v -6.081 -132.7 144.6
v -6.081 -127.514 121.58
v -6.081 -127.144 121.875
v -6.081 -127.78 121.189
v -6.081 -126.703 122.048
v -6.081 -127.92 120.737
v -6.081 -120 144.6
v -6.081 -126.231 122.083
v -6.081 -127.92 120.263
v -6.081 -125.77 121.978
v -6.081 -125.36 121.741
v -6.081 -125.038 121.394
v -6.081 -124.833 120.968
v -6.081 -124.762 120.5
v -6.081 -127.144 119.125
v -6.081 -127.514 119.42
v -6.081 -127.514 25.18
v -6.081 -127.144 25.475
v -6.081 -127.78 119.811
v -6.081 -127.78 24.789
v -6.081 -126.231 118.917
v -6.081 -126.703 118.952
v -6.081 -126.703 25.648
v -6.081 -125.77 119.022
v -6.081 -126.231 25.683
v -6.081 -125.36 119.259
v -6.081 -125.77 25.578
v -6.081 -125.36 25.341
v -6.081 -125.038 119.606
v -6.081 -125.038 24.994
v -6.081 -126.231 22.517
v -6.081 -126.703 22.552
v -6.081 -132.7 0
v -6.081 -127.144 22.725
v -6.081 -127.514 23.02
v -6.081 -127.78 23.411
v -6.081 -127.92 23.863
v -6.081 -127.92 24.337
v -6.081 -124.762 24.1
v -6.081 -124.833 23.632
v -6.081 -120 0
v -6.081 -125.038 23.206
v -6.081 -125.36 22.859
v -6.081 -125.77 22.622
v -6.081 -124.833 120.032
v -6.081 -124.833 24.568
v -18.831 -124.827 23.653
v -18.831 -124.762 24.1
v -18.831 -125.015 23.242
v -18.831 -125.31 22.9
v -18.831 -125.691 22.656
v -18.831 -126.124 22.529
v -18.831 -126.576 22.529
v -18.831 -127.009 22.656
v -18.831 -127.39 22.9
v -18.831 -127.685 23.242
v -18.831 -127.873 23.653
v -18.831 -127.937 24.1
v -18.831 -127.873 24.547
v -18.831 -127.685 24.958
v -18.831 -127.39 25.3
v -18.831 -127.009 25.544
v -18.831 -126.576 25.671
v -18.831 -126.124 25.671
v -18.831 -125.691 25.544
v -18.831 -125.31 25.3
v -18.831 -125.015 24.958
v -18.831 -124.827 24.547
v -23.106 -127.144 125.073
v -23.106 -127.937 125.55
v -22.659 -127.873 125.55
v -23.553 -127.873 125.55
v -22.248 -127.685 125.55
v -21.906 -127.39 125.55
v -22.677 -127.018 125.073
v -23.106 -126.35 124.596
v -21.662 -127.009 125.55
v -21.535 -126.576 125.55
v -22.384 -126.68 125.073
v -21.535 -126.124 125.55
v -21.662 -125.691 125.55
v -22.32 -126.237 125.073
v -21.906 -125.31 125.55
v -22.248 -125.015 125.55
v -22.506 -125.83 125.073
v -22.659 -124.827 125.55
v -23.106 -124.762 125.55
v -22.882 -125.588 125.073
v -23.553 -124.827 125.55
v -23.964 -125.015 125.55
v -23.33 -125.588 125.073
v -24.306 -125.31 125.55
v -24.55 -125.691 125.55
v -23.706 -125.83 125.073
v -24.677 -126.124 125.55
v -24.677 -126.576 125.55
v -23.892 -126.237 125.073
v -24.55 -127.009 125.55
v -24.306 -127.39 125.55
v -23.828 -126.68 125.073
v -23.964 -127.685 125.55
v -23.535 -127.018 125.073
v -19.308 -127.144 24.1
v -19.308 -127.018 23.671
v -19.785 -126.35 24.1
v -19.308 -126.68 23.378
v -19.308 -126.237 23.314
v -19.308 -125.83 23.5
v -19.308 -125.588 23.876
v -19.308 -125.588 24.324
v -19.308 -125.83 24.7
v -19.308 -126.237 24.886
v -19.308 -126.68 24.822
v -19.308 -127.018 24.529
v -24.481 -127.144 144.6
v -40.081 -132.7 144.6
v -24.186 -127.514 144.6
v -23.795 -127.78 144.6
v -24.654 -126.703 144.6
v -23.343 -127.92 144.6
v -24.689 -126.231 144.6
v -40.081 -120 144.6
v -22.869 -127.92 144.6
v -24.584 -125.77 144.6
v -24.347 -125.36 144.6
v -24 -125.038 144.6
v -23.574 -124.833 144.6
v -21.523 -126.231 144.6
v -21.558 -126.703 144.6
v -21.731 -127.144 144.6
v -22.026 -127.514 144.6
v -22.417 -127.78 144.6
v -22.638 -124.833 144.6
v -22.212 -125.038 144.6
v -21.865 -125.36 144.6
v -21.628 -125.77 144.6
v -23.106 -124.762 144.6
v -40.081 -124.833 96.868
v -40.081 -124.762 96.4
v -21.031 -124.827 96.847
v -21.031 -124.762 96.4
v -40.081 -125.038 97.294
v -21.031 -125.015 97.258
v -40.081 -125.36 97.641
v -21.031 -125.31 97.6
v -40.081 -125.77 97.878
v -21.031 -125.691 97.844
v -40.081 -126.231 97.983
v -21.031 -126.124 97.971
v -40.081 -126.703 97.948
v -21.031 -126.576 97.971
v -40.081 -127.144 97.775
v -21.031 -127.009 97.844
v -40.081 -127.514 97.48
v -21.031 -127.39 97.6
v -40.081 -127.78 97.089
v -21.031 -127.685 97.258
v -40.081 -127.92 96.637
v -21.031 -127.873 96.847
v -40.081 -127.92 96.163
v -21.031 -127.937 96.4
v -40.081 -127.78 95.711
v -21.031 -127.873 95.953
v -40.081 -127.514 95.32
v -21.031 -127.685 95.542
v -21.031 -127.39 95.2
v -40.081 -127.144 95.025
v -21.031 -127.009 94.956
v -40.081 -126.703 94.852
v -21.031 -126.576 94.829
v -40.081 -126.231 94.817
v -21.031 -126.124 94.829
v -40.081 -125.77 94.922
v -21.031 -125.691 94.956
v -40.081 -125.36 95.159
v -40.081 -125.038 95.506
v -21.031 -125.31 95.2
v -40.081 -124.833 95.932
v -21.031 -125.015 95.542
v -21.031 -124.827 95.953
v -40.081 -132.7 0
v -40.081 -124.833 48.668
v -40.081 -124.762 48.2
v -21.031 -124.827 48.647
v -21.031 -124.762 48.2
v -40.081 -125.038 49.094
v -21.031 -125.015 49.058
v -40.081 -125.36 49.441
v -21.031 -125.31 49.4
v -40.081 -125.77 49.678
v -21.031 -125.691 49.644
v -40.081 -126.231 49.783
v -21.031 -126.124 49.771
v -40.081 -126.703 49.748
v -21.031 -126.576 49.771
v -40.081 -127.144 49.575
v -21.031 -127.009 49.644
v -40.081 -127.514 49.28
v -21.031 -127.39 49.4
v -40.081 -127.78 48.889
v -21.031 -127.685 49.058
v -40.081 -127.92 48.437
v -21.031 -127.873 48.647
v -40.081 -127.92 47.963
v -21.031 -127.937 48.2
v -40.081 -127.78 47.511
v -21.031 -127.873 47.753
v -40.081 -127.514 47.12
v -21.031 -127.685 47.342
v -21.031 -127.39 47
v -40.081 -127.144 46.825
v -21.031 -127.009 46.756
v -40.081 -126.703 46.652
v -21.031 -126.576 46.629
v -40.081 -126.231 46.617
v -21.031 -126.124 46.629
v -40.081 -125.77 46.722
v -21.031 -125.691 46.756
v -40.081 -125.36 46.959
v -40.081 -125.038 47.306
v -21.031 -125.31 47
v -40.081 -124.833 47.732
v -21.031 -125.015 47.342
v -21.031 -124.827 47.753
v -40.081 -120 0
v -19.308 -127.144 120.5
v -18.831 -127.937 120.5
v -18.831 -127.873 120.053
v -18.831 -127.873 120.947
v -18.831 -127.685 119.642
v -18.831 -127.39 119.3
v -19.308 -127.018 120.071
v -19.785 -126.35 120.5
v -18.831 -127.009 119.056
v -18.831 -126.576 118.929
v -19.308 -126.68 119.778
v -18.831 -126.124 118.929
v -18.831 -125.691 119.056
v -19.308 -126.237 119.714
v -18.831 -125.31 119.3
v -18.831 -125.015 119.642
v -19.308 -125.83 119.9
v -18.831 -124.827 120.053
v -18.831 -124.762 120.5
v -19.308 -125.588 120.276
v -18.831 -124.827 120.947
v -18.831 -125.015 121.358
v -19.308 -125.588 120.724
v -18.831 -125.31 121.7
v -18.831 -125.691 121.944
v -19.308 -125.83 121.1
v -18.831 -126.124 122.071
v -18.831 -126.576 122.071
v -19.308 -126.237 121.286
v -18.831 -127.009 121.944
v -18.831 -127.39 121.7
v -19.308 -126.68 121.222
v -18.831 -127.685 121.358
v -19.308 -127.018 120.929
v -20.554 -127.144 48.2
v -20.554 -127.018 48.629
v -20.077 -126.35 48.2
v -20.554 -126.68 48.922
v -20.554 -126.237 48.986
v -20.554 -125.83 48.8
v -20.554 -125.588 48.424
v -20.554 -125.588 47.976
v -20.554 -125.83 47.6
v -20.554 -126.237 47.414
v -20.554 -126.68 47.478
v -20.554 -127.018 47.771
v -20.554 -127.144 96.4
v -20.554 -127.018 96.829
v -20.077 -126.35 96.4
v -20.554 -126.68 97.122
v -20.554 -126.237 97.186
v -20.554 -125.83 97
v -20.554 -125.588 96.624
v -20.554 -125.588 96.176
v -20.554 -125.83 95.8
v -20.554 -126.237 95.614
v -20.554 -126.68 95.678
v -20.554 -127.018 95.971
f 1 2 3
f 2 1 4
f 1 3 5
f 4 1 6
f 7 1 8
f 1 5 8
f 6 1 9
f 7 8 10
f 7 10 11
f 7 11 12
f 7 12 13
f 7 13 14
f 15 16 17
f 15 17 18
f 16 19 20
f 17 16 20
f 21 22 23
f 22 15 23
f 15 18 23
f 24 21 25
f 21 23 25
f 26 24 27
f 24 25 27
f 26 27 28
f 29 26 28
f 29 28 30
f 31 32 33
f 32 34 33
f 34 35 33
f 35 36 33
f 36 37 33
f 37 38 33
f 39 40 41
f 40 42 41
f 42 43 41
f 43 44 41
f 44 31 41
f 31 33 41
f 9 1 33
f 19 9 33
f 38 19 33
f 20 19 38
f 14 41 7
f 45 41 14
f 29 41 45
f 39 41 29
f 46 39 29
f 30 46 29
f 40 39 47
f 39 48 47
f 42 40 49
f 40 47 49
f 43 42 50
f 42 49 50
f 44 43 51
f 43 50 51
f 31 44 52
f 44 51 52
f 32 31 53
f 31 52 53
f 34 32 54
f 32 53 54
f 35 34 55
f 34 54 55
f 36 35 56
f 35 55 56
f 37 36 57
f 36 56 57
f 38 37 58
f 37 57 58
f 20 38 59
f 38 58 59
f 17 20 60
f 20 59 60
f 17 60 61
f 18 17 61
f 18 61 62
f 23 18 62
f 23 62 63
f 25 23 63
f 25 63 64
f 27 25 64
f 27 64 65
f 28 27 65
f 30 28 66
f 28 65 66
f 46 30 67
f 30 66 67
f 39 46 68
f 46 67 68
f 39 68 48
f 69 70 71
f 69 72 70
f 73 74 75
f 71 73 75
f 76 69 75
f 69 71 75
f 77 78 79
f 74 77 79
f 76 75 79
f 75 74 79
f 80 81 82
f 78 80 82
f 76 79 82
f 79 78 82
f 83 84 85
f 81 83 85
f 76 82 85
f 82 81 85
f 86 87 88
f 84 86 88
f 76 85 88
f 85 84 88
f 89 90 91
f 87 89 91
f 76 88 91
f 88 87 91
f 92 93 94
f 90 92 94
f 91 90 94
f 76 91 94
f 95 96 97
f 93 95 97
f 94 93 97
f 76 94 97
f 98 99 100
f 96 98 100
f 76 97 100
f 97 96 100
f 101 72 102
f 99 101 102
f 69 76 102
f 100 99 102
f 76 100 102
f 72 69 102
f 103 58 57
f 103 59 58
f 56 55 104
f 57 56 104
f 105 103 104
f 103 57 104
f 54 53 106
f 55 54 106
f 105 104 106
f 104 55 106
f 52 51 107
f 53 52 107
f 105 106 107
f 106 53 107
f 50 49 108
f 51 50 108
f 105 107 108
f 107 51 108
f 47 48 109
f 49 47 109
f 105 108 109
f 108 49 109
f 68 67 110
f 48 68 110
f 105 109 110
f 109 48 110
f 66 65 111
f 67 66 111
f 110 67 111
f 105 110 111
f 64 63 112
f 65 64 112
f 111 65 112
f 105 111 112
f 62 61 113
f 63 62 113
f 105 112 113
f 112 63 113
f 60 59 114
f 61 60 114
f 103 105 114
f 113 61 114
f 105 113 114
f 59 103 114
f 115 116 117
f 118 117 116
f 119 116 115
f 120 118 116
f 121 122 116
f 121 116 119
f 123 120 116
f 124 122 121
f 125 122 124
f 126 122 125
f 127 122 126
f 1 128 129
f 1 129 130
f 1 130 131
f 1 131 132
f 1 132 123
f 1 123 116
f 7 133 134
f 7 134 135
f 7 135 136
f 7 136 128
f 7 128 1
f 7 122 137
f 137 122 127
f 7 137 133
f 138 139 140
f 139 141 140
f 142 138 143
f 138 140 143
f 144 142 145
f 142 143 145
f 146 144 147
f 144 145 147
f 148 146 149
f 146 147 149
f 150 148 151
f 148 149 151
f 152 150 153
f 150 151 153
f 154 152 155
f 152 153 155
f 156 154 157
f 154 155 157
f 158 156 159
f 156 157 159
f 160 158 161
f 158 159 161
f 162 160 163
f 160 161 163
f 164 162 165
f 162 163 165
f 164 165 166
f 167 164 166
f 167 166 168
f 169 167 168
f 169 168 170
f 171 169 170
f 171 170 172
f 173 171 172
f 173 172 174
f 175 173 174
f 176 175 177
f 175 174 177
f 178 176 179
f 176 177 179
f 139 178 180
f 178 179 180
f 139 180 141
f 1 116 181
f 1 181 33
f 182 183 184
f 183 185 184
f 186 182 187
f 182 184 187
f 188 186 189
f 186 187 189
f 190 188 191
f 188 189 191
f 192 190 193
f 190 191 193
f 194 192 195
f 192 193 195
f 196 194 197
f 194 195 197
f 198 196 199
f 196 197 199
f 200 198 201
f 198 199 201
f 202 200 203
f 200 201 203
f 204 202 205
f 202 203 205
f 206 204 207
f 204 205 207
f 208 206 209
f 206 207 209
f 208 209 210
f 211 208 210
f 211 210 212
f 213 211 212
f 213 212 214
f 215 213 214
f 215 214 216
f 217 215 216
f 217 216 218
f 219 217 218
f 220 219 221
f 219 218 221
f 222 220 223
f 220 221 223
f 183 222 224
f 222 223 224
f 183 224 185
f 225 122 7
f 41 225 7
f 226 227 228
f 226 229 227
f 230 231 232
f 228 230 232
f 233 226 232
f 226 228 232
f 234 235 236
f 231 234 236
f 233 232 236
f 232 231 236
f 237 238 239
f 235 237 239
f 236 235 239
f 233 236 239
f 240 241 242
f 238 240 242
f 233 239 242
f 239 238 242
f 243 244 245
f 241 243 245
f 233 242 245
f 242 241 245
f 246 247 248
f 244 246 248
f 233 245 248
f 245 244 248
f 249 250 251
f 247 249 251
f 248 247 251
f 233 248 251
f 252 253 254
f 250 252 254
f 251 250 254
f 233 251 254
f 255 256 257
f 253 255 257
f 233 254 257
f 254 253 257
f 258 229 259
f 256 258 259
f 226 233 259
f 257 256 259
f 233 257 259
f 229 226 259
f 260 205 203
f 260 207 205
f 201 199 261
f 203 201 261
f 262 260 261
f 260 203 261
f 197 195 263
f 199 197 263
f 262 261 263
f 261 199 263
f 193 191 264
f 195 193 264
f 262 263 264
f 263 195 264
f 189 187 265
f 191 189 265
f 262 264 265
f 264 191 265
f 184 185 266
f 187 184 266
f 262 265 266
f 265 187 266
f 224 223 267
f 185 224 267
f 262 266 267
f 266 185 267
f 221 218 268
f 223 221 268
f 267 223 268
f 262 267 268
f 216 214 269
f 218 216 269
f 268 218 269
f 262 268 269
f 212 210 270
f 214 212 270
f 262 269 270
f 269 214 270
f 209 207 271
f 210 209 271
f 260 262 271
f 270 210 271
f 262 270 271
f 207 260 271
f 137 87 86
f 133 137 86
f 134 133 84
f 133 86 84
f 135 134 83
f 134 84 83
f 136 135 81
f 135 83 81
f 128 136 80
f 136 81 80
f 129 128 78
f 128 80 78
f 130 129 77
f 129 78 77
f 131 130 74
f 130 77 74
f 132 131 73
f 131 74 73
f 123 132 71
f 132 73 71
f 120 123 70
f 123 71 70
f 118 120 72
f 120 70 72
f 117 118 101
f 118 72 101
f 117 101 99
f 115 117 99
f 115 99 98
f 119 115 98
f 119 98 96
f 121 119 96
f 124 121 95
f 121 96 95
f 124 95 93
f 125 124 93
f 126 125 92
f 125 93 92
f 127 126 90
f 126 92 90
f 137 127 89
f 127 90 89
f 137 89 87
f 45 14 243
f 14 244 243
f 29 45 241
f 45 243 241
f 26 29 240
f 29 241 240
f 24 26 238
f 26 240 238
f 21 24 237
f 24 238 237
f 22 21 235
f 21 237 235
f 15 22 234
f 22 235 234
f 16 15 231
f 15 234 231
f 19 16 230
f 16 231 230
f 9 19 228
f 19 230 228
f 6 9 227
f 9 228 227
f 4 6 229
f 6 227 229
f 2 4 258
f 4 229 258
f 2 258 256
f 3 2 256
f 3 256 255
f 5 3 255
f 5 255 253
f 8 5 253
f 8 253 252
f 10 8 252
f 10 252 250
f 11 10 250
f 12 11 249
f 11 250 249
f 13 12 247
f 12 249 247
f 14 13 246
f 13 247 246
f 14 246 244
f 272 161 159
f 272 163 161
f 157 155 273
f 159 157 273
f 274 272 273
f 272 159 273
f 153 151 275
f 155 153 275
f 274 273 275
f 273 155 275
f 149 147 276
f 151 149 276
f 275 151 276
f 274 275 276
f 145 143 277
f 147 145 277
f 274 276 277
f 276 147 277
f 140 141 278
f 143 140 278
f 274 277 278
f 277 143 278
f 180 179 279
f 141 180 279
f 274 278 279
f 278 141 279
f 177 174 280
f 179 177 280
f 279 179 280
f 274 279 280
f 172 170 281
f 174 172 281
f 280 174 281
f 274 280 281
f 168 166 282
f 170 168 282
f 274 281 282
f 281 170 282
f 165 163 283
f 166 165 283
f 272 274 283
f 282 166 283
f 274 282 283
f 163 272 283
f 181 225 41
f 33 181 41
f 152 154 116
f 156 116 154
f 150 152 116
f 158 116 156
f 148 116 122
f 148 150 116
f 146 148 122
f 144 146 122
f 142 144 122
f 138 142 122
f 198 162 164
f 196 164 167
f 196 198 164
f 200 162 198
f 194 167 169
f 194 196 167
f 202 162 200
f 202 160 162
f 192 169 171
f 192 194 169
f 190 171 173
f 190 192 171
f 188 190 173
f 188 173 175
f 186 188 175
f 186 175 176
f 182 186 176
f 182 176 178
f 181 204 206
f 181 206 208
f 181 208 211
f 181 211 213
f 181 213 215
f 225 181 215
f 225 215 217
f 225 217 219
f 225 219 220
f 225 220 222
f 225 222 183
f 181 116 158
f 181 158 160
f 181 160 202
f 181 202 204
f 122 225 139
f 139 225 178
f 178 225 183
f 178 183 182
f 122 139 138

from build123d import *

# Parameters (mm, degrees)
SKETCH1_W           = 34
SKETCH1_H           = 12.7
BOSS_EXTRUDE1_DEPTH = 144.6
HOLE1_D             = 3.175
HOLE1_DEPTH         = 31.75
HOLE1_CSINK_D       = 10.16
HOLE1_CSINK_ANGLE   = 82
HOLE1_TIP           = 0.953866233
HOLE2_D             = 3.175
HOLE2_DEPTH         = 31.75
HOLE2_CSINK_D       = 10.16
HOLE2_CSINK_ANGLE   = 82
HOLE2_TIP           = 0.953866233
HOLE5_D             = 3.175
HOLE5_DEPTH         = 31.75
HOLE5_CSINK_D       = 10.16
HOLE5_CSINK_ANGLE   = 82
HOLE5_TIP           = 0.953866233
HOLE6_D             = 3.175
HOLE6_DEPTH         = 31.75
HOLE6_CSINK_D       = 10.16
HOLE6_CSINK_ANGLE   = 82
HOLE6_TIP           = 0.953866233
HOLE7_D             = 3.175
HOLE7_DEPTH         = 31.75
HOLE7_CSINK_D       = 10.16
HOLE7_CSINK_ANGLE   = 82
HOLE7_TIP           = 0.953866233


with BuildPart() as part:
    # Sketch1 → Boss-Extrude1 (new body)
    with BuildSketch(Plane.XY):
        with Locations((-23.08092085, -126.349999994)):
            Rectangle(SKETCH1_W, SKETCH1_H)
    extrude(amount=BOSS_EXTRUDE1_DEPTH)

    # Hole1
    with Locations(Plane(origin=(12.91907915, 0, 155.024290059), x_dir=(0, -1, 0), z_dir=(1, 0, 0))):
        with Locations((126.349999994, 161.374290059), (146.083333327, 4.074290059), (172.166666661, 4.074290059), (126.349999994, 34.524290059), (126.349999994, 130.924290059), (-172.166666661, 4.074290059), (-146.083333327, 4.074290059), (-126.349999994, 34.524290059), (-126.349999994, 130.924290059), (-126.349999994, 161.374290059)):
            CounterSinkHole(HOLE1_D / 2, HOLE1_CSINK_D / 2, depth=HOLE1_DEPTH, counter_sink_angle=HOLE1_CSINK_ANGLE)
            with Locations((0, 0, -(HOLE1_DEPTH + HOLE1_TIP / 2))):  # 118° drill point
                Cone(0, HOLE1_D / 2, HOLE1_TIP, mode=Mode.SUBTRACT)

    # Hole2
    with Locations(Plane(origin=(12.91907915, 0, -10.424290059), x_dir=(0, 1, 0), z_dir=(1, 0, 0))):
        with Locations((126.349999994, 161.374290059), (146.083333327, 4.074290059), (172.166666661, 4.074290059), (126.349999994, 34.524290059), (126.349999994, 130.924290059), (-172.166666661, 4.074290059), (-146.083333327, 4.074290059), (-126.349999994, 34.524290059), (-126.349999994, 130.924290059), (-126.349999994, 161.374290059)):
            CounterSinkHole(HOLE2_D / 2, HOLE2_CSINK_D / 2, depth=HOLE2_DEPTH, counter_sink_angle=HOLE2_CSINK_ANGLE)
            with Locations((0, 0, -(HOLE2_DEPTH + HOLE2_TIP / 2))):  # 118° drill point
                Cone(0, HOLE2_D / 2, HOLE2_TIP, mode=Mode.SUBTRACT)

    # Hole5
    with Locations(Plane(origin=(-195.367659426, 0, 157.3), x_dir=(0, -1, 0), z_dir=(0, 0, 1))):
        with Locations((207.774999994, 172.261738577), (126.349999994, 172.261738577)):
            CounterSinkHole(HOLE5_D / 2, HOLE5_CSINK_D / 2, depth=HOLE5_DEPTH, counter_sink_angle=HOLE5_CSINK_ANGLE)
            with Locations((0, 0, -(HOLE5_DEPTH + HOLE5_TIP / 2))):  # 118° drill point
                Cone(0, HOLE5_D / 2, HOLE5_TIP, mode=Mode.SUBTRACT)

    # Hole6
    with Locations(Plane(origin=(-52.78092085, 0, -10.424290059), x_dir=(0, -1, 0), z_dir=(-1, 0, 0))):
        with Locations((-207.774999994, 333.02141023), (-207.774999994, 225.48903684), (-207.774999994, 137.424290059), (-172.166666661, 4.074290059), (-146.083333327, 4.074290059), (-94.599999994, 161.374290059), (0, 161.374290059), (94.599999994, 161.374290059), (146.083333327, 4.074290059), (172.166666661, 4.074290059), (207.774999994, 137.424290059), (207.774999994, 225.48903684), (207.774999994, 333.02141023), (166.795833328, 301.970350905), (40.979166666, 301.970350905), (-40.979166666, 301.970350905), (-166.795833328, 301.970350905), (0, 193.124290059), (0, 301.970350905), (0, 412.366411751), (-126.349999994, 106.824290059), (-126.349999994, 58.624290059), (126.349999994, 58.624290059), (126.349999994, 106.824290059)):
            CounterSinkHole(HOLE6_D / 2, HOLE6_CSINK_D / 2, depth=HOLE6_DEPTH, counter_sink_angle=HOLE6_CSINK_ANGLE)
            with Locations((0, 0, -(HOLE6_DEPTH + HOLE6_TIP / 2))):  # 118° drill point
                Cone(0, HOLE6_D / 2, HOLE6_TIP, mode=Mode.SUBTRACT)

    # Hole7
    with Locations(Plane(origin=(-52.78092085, 0, 155.024290059), x_dir=(0, 1, 0), z_dir=(-1, 0, 0))):
        with Locations((-207.774999994, 333.02141023), (-207.774999994, 225.48903684), (-207.774999994, 137.424290059), (-172.166666661, 4.074290059), (-146.083333327, 4.074290059), (-94.599999994, 161.374290059), (0, 161.374290059), (94.599999994, 161.374290059), (146.083333327, 4.074290059), (172.166666661, 4.074290059), (207.774999994, 137.424290059), (207.774999994, 225.48903684), (207.774999994, 333.02141023), (166.795833328, 301.970350905), (40.979166666, 301.970350905), (-40.979166666, 301.970350905), (-166.795833328, 301.970350905), (0, 193.124290059), (0, 301.970350905), (0, 412.366411751), (-126.349999994, 106.824290059), (-126.349999994, 58.624290059), (126.349999994, 58.624290059), (126.349999994, 106.824290059)):
            CounterSinkHole(HOLE7_D / 2, HOLE7_CSINK_D / 2, depth=HOLE7_DEPTH, counter_sink_angle=HOLE7_CSINK_ANGLE)
            with Locations((0, 0, -(HOLE7_DEPTH + HOLE7_TIP / 2))):  # 118° drill point
                Cone(0, HOLE7_D / 2, HOLE7_TIP, mode=Mode.SUBTRACT)


solid = part.part
